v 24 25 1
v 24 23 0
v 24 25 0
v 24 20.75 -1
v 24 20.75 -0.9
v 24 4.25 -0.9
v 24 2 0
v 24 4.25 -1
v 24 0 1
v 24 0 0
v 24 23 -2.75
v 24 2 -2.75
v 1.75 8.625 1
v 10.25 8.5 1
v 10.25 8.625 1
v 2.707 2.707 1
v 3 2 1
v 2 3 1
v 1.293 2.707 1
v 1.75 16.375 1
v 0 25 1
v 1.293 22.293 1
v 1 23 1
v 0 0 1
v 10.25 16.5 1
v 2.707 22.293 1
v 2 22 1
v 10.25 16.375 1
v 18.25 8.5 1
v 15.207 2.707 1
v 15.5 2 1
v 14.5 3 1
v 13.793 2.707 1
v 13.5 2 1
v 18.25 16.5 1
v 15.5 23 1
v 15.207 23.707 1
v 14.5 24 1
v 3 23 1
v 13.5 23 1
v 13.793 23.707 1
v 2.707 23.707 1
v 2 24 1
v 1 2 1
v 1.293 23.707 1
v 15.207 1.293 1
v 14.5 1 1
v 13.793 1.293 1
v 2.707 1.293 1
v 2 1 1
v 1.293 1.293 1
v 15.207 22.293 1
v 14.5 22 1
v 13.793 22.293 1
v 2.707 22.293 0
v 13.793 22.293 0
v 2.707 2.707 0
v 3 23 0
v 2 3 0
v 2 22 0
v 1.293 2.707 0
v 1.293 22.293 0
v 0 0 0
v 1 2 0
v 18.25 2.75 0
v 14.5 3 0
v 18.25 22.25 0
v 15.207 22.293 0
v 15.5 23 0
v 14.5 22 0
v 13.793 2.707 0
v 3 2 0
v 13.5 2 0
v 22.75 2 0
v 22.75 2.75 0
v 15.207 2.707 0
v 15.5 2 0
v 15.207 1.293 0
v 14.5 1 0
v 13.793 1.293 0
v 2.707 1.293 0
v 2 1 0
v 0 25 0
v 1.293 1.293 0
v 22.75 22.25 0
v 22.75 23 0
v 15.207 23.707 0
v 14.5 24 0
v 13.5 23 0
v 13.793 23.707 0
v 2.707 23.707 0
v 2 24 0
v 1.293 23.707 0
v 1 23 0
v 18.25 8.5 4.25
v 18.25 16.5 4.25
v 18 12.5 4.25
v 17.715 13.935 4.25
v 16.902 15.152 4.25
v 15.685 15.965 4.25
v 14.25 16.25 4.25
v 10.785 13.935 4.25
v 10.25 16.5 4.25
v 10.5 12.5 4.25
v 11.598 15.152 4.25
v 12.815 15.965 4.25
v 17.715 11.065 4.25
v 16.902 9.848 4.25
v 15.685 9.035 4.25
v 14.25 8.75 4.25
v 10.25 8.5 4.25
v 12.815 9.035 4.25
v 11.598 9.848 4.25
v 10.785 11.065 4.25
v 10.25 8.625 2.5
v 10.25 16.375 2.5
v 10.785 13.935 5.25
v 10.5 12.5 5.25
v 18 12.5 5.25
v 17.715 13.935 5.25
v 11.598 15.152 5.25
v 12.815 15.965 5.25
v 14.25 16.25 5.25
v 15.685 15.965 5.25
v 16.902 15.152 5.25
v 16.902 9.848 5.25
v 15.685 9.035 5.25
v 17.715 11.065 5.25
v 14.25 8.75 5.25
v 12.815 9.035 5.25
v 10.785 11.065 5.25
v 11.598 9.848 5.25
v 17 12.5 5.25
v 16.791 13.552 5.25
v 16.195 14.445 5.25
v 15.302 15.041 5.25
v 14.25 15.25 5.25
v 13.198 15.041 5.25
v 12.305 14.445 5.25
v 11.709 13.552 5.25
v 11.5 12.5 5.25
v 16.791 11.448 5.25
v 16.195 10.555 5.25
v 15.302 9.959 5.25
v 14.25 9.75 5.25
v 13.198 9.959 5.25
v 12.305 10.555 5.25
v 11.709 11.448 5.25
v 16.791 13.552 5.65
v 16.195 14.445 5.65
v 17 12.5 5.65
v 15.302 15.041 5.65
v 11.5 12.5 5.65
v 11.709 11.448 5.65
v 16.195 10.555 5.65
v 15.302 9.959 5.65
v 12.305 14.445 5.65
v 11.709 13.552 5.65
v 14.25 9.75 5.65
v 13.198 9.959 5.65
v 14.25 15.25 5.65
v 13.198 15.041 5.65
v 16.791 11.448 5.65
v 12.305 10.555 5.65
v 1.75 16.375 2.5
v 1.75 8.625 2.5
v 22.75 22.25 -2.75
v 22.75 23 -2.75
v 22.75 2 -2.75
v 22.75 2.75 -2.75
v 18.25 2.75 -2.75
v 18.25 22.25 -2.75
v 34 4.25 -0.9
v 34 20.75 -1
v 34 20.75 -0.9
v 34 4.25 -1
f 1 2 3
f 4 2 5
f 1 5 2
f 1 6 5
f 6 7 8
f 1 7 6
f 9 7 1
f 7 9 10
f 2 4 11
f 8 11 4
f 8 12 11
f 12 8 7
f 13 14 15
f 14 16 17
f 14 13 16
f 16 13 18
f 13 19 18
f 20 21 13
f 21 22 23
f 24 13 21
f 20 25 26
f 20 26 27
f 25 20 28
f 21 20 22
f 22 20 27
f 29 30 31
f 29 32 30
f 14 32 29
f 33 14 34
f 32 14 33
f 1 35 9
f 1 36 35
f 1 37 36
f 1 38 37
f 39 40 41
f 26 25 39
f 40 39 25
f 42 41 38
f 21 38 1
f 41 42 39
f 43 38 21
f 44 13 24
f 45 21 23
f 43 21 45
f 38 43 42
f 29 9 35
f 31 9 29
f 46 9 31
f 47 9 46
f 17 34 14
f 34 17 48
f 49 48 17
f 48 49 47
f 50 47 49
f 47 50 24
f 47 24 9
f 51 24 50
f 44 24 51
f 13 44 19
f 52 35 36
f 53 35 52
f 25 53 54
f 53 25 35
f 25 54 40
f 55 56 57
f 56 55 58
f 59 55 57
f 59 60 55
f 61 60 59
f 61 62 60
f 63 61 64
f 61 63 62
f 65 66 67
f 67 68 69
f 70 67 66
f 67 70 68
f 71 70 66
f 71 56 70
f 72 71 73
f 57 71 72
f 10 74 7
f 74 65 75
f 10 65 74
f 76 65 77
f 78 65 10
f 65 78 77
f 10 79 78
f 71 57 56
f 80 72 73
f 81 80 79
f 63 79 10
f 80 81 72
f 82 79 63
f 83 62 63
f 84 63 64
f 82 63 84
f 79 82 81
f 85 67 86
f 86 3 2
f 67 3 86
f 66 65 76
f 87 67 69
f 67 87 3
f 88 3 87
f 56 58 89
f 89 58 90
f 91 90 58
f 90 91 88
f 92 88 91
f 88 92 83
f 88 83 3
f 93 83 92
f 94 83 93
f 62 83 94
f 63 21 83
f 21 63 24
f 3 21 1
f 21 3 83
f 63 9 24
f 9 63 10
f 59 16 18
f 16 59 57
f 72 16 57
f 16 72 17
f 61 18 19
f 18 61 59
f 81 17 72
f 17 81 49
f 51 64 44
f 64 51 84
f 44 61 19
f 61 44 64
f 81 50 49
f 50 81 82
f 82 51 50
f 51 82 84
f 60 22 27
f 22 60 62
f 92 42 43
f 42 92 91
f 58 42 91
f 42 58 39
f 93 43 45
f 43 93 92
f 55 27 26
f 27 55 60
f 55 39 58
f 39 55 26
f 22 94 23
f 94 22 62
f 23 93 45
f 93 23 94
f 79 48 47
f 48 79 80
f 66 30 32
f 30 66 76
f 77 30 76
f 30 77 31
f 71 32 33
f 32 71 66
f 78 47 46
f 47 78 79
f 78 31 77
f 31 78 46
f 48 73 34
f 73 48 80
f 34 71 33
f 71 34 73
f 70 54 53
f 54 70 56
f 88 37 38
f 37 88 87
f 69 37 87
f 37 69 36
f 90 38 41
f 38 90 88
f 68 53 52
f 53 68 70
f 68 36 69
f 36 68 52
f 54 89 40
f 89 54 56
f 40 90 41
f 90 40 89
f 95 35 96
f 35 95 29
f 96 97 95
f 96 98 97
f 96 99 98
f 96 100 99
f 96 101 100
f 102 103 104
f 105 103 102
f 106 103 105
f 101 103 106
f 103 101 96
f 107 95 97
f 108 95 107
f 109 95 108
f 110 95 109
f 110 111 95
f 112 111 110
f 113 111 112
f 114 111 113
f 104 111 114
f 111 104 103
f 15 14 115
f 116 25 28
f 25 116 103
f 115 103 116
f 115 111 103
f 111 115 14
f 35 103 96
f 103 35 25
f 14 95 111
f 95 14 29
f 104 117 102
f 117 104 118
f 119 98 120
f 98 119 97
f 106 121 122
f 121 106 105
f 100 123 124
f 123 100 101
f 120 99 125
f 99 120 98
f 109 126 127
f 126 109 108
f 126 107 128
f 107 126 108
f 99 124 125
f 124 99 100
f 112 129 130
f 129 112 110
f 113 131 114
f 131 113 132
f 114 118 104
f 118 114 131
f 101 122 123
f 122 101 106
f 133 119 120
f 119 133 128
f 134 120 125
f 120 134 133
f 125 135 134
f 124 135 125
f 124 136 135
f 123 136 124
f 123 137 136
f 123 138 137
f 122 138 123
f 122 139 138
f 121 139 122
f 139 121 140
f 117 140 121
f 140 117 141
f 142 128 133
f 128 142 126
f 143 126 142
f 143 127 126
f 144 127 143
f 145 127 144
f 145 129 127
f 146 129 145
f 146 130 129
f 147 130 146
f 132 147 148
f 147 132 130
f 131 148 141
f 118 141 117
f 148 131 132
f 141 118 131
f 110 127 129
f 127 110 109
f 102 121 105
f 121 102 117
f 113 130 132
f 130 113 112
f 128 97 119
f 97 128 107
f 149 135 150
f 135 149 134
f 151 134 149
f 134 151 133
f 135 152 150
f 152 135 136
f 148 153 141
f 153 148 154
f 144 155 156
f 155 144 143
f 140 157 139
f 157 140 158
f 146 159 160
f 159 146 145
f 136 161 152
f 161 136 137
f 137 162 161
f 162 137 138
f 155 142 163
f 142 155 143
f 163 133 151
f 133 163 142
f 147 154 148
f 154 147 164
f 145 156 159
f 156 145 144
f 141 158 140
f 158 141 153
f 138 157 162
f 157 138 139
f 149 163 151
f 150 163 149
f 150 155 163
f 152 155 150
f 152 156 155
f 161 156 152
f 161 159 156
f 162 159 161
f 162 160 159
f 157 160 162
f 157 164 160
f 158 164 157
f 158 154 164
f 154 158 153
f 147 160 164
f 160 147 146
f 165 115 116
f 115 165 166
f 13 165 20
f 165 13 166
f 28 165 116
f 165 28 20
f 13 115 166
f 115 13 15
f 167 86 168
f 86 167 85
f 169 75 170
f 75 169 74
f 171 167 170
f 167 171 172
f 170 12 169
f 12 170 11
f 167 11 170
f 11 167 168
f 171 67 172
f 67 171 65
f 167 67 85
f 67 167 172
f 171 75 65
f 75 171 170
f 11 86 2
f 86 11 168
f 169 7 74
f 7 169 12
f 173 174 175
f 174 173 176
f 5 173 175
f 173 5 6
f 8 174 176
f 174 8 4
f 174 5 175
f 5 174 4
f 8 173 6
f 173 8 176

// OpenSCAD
// https://github.com/larsch/openscad-modules/blob/master/rpi-camera.scad
// Raspberry Pi Camera - OpenSCAD
//
// License: CC BY-SA 2.0
// https://creativecommons.org/licenses/by-sa/2.0/legalcode
//
// This case was designed for the Rasperry Pi 1 Model B, because that
// the one i had lying around for this project. I power it via the pin
// header 5V pin using a DC-DC buck converter and an external 9V DC
// power supply. The camera ribbon cable is slighly skewed inside the
// case, because I wanted the case to be small and it doesn't line up
// well.

module rpi_camera() {
     color("darkblue")
	  difference() {
	  cube([24,25,1]);
	  translate([2,2,-1]) cylinder(d=2,h=3,$fn=8);
	  translate([2,23,-1]) cylinder(d=2,h=3,$fn=8);
	  translate([14.5,2,-1]) cylinder(d=2,h=3,$fn=8);
	  translate([14.5,23,-1]) cylinder(d=2,h=3,$fn=8);
     }
     color("DimGray") union() {
	  translate([10.25,8.5,1]) cube([8,8,3.25]);
	  translate([10.25+4,12.5,1+3.25]) cylinder(d=7.5,h=1,$fn=16);
	  translate([10.25+4,12.5,1+3.25+0.7]) cylinder(d=5.5,h=0.7,$fn=16);
     }
     color("orange") translate([1.75,8.625,1]) cube([8.5,7.75,1.5]);
     color("brown") translate([24-5.75,2.75,-2.75]) cube([4.5,19.5,2.75]);
     color("black") translate([22.75,2,-2.75]) cube([1.25,21,2.75]);
     color("grey") translate([24,4.25,-1]) cube([10,16.5,0.1]);
}
rpi_camera();
